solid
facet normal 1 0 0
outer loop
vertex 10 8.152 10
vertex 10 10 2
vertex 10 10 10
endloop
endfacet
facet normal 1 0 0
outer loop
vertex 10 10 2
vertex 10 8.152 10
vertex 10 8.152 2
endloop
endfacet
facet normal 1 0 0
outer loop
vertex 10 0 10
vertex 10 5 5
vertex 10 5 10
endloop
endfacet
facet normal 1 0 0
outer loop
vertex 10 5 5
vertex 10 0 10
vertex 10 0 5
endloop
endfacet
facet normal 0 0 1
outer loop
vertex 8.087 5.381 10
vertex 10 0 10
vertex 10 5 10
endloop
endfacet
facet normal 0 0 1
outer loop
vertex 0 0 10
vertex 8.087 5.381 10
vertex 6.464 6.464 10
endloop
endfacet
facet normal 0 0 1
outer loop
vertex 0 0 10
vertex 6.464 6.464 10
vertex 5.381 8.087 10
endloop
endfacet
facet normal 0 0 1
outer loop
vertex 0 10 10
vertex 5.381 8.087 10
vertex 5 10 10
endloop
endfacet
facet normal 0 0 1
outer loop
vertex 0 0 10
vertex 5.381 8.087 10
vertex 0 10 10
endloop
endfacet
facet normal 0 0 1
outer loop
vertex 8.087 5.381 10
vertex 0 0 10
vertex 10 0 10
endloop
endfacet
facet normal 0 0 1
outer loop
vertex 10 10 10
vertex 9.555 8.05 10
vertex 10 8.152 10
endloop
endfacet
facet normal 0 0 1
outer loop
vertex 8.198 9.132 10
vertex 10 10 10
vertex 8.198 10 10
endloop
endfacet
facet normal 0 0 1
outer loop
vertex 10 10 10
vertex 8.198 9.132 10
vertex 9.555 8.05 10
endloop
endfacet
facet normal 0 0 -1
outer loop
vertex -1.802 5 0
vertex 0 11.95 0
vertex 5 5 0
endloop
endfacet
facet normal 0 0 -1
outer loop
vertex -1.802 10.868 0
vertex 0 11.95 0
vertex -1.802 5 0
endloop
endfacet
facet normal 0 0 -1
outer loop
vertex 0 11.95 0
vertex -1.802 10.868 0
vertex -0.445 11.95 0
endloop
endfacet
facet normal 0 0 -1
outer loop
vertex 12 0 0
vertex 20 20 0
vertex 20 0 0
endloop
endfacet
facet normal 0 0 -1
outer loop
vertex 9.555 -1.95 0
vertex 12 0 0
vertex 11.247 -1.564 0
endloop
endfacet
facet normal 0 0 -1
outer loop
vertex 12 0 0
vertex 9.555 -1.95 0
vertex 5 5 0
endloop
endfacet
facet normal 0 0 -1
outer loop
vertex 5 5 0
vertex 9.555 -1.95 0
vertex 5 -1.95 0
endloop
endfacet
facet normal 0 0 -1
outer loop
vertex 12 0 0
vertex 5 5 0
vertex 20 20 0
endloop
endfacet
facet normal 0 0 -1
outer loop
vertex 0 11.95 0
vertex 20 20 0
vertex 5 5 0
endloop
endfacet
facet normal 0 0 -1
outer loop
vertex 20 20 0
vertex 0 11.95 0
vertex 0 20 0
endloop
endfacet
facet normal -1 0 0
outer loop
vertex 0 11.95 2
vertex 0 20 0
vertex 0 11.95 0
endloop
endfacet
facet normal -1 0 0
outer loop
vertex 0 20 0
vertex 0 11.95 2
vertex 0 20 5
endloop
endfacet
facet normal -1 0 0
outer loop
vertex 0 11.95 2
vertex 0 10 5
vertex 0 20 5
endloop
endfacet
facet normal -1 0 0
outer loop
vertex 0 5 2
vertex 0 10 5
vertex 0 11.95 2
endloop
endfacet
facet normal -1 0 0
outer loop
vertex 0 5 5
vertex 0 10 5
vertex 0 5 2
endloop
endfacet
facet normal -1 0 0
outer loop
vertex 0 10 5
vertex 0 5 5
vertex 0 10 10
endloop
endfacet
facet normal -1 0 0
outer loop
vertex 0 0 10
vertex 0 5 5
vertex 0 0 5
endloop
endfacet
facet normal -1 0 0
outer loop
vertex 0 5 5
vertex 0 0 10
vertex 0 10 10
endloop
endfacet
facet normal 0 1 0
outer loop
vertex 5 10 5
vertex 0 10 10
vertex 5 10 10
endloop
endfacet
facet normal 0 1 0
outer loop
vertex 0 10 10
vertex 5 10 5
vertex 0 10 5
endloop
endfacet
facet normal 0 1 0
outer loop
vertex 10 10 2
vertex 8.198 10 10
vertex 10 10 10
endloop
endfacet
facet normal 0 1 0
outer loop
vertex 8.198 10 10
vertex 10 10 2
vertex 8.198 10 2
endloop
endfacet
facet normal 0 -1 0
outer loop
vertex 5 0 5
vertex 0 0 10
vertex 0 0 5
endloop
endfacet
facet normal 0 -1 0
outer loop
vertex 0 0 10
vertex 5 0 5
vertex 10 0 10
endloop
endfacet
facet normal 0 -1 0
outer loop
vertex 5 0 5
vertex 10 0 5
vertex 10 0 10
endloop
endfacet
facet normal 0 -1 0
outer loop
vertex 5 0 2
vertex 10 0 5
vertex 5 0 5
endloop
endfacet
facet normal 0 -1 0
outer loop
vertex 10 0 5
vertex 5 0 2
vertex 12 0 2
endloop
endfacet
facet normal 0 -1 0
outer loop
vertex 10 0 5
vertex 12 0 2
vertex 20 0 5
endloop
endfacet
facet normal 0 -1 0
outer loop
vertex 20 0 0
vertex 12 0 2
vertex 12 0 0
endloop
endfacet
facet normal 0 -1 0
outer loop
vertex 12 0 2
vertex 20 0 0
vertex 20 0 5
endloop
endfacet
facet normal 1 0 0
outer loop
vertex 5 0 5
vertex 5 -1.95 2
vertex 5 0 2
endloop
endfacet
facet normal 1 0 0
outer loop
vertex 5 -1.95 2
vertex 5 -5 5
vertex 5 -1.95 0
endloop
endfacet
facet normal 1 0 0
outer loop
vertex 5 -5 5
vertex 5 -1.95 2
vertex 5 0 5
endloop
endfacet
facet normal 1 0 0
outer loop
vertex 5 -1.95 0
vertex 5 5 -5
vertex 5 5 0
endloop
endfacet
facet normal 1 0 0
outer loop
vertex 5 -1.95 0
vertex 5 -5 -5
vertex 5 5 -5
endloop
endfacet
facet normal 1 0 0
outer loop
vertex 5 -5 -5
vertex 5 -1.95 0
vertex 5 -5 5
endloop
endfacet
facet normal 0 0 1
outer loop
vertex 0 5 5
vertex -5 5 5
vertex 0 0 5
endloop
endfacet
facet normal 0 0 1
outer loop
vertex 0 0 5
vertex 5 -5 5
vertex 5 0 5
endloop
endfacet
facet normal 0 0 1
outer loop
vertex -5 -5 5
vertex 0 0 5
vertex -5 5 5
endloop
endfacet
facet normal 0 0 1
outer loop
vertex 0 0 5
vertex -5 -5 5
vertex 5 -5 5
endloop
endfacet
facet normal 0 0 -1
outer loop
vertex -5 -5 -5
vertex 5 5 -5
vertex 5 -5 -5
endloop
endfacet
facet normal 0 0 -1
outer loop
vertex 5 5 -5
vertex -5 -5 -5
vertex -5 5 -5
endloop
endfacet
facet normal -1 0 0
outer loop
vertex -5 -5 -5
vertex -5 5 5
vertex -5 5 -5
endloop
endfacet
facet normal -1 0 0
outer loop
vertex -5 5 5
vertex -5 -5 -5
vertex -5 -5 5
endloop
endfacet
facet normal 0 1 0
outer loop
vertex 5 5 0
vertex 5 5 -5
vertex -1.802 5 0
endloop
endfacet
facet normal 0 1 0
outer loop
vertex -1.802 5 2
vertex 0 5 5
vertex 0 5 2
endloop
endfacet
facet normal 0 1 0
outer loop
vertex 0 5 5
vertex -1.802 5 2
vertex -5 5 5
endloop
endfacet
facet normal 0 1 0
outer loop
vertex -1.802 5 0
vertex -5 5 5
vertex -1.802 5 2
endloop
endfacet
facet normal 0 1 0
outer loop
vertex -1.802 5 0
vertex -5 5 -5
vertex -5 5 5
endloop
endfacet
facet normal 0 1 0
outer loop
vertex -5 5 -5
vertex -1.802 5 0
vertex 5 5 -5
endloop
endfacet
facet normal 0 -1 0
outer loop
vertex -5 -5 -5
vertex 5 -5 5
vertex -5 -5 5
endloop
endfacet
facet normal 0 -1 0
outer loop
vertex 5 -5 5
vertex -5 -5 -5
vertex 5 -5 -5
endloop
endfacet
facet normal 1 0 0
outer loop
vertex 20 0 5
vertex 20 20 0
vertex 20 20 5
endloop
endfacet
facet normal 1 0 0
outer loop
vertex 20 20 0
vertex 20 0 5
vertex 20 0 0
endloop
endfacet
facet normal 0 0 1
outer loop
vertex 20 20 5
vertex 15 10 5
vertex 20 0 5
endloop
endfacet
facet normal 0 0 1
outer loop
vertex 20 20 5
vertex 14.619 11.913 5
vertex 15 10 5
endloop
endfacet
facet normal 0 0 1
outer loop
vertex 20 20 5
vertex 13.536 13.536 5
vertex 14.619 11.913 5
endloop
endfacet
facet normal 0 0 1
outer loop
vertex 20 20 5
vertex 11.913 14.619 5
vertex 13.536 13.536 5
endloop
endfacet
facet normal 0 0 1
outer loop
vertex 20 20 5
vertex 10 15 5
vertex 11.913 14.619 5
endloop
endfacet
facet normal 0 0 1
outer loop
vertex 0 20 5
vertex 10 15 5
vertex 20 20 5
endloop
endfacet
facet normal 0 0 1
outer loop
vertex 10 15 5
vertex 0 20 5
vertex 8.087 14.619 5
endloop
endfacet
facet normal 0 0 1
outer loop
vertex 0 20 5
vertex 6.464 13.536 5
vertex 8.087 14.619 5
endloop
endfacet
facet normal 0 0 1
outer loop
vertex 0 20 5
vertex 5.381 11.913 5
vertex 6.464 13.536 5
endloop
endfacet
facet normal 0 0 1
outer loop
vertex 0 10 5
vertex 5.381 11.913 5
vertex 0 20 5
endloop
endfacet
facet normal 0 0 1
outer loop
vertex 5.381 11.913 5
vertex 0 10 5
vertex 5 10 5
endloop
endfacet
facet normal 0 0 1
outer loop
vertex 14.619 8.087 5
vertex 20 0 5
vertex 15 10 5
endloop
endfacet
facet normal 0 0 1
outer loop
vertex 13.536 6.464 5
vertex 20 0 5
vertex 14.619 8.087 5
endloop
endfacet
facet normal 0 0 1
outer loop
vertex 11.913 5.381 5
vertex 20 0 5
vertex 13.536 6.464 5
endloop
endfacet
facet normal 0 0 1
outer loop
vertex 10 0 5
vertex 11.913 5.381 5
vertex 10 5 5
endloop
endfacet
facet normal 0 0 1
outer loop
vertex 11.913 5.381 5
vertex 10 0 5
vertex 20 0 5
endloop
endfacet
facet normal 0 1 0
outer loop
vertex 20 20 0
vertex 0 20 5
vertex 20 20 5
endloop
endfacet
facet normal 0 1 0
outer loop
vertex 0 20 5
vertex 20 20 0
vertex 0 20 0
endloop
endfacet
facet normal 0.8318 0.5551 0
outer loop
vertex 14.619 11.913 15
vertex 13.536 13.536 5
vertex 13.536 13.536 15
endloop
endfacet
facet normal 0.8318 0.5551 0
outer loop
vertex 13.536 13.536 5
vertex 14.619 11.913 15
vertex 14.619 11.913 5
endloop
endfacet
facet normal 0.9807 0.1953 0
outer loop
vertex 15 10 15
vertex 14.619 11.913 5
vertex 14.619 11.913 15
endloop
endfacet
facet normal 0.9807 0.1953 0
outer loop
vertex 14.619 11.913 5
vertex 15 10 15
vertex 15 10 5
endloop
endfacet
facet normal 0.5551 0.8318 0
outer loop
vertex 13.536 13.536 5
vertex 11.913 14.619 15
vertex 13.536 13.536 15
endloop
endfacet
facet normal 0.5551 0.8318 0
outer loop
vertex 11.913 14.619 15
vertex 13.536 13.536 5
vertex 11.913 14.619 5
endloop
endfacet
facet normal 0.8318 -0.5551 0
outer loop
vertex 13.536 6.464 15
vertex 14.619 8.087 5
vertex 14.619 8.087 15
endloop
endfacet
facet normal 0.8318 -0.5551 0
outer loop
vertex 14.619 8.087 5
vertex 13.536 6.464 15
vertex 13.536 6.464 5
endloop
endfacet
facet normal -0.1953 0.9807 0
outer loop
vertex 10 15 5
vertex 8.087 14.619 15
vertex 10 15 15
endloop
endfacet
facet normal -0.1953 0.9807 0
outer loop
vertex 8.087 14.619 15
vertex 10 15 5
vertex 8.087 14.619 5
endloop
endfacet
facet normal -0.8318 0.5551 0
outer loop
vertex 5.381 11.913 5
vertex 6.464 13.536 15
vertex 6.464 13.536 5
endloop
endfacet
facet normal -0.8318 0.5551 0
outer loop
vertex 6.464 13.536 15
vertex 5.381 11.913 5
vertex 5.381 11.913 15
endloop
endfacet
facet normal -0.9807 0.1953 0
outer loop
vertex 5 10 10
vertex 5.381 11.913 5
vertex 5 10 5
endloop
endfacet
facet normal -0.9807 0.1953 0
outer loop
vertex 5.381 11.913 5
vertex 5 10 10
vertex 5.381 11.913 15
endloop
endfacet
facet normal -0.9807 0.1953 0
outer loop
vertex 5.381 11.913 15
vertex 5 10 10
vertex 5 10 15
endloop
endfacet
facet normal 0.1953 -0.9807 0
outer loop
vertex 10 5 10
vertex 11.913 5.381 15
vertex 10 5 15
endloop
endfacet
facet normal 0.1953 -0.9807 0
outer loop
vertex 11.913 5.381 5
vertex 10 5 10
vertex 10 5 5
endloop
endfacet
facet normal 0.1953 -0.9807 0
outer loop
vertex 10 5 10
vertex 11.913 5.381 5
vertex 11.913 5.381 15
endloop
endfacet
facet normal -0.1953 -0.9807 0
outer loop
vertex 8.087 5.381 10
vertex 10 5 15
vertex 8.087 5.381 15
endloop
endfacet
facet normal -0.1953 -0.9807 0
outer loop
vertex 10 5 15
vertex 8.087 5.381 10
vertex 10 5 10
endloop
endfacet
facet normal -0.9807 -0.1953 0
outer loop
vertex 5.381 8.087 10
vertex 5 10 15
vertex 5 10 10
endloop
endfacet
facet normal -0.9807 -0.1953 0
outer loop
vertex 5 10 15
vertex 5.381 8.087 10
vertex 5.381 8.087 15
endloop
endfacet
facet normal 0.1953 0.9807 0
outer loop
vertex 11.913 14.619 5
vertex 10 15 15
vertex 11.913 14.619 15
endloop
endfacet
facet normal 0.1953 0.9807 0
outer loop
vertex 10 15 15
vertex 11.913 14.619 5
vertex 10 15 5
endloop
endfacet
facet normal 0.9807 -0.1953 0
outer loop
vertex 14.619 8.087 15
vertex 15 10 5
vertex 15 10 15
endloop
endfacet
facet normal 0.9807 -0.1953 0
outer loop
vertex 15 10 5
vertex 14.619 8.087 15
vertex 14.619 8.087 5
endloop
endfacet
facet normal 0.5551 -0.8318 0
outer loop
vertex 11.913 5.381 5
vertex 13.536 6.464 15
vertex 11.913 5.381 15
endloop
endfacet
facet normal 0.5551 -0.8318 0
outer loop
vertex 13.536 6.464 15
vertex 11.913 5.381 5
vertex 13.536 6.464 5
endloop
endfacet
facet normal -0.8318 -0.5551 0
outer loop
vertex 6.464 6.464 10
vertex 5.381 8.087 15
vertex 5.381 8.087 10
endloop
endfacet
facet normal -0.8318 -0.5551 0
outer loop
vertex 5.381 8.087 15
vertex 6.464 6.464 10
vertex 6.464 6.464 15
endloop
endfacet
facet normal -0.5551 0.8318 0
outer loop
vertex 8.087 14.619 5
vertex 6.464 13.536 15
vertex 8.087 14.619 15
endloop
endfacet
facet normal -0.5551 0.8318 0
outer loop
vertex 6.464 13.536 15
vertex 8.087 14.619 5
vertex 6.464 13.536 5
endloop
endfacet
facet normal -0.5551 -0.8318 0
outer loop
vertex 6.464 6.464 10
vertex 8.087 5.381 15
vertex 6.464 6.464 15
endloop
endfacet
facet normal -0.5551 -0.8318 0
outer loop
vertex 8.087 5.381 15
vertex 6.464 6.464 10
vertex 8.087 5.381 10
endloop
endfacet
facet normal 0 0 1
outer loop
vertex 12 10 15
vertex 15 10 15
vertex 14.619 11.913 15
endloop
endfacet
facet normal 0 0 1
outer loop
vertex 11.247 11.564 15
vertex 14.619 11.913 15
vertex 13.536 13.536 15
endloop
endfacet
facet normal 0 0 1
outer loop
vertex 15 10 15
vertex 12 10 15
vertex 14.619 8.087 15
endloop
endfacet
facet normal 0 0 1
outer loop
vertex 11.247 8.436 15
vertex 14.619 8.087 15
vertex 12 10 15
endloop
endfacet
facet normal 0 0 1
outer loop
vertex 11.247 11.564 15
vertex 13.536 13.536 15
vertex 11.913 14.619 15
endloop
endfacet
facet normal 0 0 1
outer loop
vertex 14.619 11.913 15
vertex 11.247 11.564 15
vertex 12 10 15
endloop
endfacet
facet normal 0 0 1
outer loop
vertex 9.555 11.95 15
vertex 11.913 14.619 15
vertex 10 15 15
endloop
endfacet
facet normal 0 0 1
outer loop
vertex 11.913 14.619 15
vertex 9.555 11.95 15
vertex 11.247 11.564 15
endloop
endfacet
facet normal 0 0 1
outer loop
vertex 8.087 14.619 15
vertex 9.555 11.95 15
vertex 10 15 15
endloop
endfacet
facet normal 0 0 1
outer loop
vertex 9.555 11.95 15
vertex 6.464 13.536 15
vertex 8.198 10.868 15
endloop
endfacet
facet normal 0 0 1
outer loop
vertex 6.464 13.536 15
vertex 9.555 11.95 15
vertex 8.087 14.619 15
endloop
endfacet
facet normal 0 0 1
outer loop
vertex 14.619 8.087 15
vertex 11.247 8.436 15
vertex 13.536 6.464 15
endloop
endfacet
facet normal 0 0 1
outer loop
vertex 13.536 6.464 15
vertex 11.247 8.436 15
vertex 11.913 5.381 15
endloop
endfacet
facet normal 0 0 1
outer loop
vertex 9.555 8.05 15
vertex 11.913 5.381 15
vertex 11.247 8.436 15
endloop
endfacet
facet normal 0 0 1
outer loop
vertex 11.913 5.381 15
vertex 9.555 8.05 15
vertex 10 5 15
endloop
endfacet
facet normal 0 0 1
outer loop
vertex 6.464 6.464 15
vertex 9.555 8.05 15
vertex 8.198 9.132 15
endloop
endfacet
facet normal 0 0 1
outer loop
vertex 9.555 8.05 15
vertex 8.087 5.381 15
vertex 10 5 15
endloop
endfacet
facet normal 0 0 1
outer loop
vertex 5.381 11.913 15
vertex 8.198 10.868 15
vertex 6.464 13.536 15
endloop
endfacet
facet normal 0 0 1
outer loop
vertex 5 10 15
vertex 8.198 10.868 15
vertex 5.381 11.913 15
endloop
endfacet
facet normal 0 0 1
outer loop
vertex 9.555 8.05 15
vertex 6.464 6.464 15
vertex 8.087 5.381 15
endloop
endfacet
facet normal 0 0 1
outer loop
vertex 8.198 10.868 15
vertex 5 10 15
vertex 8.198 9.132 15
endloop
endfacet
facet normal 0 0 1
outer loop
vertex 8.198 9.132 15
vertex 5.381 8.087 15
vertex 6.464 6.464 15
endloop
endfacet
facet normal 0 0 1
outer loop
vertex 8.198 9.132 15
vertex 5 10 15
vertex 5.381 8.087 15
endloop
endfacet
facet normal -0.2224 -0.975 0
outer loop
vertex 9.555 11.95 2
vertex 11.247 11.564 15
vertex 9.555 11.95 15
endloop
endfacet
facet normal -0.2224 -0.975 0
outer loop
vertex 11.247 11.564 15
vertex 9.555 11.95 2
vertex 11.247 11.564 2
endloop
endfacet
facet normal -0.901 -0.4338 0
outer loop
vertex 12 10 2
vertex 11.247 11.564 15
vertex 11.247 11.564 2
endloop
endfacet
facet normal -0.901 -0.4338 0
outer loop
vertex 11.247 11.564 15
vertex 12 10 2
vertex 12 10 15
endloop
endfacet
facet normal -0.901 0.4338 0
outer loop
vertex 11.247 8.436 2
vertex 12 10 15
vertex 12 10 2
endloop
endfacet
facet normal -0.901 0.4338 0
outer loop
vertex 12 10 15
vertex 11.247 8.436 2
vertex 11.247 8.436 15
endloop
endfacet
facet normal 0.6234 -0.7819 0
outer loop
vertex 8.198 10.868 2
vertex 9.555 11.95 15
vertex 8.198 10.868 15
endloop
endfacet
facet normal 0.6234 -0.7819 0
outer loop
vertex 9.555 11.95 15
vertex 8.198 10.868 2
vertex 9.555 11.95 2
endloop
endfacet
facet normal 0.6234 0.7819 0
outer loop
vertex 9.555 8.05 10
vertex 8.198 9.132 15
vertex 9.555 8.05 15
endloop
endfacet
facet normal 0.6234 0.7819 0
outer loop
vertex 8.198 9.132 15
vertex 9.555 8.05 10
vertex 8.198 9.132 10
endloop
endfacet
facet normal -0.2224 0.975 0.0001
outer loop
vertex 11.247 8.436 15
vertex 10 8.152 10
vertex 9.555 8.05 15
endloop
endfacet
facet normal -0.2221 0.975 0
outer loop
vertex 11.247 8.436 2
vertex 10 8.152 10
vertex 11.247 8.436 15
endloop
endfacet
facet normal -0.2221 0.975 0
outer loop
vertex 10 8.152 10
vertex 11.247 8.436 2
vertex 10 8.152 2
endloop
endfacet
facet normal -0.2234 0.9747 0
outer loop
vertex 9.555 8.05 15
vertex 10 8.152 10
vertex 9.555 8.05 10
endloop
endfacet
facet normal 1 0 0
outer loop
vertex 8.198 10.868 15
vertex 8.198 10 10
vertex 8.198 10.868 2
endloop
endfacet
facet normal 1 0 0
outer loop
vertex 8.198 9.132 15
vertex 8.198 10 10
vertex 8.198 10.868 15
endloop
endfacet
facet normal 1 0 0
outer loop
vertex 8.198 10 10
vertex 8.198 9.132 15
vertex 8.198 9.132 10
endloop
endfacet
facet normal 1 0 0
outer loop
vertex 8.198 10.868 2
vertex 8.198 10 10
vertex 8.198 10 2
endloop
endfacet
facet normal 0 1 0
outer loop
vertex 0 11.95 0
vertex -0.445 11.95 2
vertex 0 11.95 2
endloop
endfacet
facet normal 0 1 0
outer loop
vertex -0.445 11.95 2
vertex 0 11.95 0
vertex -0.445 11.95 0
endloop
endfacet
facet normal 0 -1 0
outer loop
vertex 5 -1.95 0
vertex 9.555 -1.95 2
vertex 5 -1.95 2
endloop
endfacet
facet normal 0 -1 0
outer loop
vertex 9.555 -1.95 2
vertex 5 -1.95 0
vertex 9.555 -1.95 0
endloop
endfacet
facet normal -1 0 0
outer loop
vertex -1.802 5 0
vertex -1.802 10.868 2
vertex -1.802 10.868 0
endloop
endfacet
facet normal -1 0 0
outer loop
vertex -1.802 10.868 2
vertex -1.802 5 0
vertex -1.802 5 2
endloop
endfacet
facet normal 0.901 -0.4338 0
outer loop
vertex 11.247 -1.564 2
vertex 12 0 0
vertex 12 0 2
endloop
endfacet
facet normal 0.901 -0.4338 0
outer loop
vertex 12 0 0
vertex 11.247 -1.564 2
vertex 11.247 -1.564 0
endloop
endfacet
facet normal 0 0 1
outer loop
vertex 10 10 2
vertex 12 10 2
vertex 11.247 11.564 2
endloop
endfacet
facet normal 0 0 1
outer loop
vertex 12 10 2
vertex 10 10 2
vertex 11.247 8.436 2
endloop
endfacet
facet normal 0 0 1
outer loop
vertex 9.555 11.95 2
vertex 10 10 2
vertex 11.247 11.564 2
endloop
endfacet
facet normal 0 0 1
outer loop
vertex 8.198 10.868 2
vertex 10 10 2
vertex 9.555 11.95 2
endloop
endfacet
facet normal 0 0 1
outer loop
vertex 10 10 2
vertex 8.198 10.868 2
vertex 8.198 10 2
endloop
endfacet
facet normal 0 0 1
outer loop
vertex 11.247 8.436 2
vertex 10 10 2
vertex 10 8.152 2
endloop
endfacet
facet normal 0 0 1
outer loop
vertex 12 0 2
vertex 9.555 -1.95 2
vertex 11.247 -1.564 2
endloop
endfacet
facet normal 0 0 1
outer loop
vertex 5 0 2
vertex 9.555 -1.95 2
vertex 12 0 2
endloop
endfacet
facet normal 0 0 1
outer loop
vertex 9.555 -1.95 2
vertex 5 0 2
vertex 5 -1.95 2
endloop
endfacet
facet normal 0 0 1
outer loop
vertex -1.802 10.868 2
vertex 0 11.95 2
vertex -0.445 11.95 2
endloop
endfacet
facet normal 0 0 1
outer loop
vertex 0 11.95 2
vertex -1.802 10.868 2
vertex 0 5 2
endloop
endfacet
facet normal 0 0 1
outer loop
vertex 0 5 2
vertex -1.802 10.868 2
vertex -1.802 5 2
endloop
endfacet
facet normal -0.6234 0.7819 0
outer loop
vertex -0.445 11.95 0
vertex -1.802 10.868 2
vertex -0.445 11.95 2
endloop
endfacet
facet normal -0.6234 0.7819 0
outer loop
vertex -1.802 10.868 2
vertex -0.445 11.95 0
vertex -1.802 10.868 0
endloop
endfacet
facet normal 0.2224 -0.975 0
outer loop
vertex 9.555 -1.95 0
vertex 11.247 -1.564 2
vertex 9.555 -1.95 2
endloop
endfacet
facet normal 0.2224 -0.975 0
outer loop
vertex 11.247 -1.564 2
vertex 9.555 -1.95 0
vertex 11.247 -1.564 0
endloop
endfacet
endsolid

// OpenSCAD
// CSG boolean nesting.
union() {
    cube(10);
    translate([5, 5, 5]) sphere(4);
}

difference() {
    cube(10, center = true);
    sphere(6);
    cylinder(h = 20, r = 2, center = true);
}

intersection() {
    cube(10, center = true);
    sphere(6.5);
}

// Implicit union via a bare block statement.
{
    cube(1);
    translate([2, 0, 0]) cube(1);
}

difference() {
    union() {
        cube([20, 20, 5]);
        translate([10, 10, 5]) cylinder(h = 10, r = 5);
    }
    translate([10, 10, -1]) cylinder(h = 20, r = 2);
}

hull() {
    translate([0, 0, 0]) circle(2);
    translate([10, 0, 0]) circle(3);
}

minkowski() {
    cube([10, 10, 1]);
    cylinder(r = 2, h = 1);
}
